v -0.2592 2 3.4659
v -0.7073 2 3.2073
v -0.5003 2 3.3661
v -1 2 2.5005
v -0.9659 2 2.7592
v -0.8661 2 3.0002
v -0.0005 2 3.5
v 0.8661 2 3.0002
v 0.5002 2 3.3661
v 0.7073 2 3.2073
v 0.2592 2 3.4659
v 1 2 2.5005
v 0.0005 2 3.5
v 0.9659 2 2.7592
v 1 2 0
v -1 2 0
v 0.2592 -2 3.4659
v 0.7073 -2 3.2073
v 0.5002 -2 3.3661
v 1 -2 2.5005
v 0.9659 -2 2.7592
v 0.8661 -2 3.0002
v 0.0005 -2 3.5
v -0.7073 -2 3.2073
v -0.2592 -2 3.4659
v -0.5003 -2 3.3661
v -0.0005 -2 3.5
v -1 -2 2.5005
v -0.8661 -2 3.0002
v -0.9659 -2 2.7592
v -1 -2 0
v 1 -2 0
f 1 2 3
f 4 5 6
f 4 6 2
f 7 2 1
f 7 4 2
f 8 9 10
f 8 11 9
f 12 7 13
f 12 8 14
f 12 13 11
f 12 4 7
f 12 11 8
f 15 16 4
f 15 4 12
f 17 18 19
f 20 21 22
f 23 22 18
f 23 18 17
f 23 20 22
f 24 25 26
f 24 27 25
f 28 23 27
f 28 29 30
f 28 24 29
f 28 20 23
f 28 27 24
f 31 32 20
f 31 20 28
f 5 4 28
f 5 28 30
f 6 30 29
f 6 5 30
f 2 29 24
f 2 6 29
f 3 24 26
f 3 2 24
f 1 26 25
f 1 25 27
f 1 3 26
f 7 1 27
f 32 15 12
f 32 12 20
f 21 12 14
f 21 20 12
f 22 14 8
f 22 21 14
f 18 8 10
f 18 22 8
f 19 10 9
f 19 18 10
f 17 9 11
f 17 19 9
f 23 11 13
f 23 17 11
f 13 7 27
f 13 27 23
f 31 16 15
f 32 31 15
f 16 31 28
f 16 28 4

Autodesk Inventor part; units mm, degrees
ref_plane "YZ Plane" through (0, 0, 0) normal (1, 0, 0) x (0, 1, 0)
ref_plane "XZ Plane" through (0, 0, 0) normal (0, 1, 0) x (-1, 0, 0)
ref_plane "XY Plane" through (0, 0, 0) normal (0, 0, 1) x (1, 0, 0)
sketch "Sketch2" plane through (0, 0, 0) normal (0, 0, 1) x (1, 0, 0)
  line L0 (-1, 2) -> (1, 2)
  line L1 (1, 2) -> (1, -2)
  line L2 (1, -2) -> (-1, -2)
  line L3 (-1, -2) -> (-1, 2)
  point P0 (0, 0)
  dimension "d2" = 4
  dimension "d3" = 2
  dimension "d4" = 1
  dimension "d5" = 2
extrude "Extrusion1" add sketch "Sketch2" along normal blind 3.5
fillet "Fillet1" radius 1 2 edges at (1, 0, 3.5) (-1, 0, 3.5)
equation "\"d4\" = 0.5 * d3"
equation "\"d5\" = 0.5 * d2"
properties part number "MSW-13-17_button#" material "PC_ABS Plastic"
